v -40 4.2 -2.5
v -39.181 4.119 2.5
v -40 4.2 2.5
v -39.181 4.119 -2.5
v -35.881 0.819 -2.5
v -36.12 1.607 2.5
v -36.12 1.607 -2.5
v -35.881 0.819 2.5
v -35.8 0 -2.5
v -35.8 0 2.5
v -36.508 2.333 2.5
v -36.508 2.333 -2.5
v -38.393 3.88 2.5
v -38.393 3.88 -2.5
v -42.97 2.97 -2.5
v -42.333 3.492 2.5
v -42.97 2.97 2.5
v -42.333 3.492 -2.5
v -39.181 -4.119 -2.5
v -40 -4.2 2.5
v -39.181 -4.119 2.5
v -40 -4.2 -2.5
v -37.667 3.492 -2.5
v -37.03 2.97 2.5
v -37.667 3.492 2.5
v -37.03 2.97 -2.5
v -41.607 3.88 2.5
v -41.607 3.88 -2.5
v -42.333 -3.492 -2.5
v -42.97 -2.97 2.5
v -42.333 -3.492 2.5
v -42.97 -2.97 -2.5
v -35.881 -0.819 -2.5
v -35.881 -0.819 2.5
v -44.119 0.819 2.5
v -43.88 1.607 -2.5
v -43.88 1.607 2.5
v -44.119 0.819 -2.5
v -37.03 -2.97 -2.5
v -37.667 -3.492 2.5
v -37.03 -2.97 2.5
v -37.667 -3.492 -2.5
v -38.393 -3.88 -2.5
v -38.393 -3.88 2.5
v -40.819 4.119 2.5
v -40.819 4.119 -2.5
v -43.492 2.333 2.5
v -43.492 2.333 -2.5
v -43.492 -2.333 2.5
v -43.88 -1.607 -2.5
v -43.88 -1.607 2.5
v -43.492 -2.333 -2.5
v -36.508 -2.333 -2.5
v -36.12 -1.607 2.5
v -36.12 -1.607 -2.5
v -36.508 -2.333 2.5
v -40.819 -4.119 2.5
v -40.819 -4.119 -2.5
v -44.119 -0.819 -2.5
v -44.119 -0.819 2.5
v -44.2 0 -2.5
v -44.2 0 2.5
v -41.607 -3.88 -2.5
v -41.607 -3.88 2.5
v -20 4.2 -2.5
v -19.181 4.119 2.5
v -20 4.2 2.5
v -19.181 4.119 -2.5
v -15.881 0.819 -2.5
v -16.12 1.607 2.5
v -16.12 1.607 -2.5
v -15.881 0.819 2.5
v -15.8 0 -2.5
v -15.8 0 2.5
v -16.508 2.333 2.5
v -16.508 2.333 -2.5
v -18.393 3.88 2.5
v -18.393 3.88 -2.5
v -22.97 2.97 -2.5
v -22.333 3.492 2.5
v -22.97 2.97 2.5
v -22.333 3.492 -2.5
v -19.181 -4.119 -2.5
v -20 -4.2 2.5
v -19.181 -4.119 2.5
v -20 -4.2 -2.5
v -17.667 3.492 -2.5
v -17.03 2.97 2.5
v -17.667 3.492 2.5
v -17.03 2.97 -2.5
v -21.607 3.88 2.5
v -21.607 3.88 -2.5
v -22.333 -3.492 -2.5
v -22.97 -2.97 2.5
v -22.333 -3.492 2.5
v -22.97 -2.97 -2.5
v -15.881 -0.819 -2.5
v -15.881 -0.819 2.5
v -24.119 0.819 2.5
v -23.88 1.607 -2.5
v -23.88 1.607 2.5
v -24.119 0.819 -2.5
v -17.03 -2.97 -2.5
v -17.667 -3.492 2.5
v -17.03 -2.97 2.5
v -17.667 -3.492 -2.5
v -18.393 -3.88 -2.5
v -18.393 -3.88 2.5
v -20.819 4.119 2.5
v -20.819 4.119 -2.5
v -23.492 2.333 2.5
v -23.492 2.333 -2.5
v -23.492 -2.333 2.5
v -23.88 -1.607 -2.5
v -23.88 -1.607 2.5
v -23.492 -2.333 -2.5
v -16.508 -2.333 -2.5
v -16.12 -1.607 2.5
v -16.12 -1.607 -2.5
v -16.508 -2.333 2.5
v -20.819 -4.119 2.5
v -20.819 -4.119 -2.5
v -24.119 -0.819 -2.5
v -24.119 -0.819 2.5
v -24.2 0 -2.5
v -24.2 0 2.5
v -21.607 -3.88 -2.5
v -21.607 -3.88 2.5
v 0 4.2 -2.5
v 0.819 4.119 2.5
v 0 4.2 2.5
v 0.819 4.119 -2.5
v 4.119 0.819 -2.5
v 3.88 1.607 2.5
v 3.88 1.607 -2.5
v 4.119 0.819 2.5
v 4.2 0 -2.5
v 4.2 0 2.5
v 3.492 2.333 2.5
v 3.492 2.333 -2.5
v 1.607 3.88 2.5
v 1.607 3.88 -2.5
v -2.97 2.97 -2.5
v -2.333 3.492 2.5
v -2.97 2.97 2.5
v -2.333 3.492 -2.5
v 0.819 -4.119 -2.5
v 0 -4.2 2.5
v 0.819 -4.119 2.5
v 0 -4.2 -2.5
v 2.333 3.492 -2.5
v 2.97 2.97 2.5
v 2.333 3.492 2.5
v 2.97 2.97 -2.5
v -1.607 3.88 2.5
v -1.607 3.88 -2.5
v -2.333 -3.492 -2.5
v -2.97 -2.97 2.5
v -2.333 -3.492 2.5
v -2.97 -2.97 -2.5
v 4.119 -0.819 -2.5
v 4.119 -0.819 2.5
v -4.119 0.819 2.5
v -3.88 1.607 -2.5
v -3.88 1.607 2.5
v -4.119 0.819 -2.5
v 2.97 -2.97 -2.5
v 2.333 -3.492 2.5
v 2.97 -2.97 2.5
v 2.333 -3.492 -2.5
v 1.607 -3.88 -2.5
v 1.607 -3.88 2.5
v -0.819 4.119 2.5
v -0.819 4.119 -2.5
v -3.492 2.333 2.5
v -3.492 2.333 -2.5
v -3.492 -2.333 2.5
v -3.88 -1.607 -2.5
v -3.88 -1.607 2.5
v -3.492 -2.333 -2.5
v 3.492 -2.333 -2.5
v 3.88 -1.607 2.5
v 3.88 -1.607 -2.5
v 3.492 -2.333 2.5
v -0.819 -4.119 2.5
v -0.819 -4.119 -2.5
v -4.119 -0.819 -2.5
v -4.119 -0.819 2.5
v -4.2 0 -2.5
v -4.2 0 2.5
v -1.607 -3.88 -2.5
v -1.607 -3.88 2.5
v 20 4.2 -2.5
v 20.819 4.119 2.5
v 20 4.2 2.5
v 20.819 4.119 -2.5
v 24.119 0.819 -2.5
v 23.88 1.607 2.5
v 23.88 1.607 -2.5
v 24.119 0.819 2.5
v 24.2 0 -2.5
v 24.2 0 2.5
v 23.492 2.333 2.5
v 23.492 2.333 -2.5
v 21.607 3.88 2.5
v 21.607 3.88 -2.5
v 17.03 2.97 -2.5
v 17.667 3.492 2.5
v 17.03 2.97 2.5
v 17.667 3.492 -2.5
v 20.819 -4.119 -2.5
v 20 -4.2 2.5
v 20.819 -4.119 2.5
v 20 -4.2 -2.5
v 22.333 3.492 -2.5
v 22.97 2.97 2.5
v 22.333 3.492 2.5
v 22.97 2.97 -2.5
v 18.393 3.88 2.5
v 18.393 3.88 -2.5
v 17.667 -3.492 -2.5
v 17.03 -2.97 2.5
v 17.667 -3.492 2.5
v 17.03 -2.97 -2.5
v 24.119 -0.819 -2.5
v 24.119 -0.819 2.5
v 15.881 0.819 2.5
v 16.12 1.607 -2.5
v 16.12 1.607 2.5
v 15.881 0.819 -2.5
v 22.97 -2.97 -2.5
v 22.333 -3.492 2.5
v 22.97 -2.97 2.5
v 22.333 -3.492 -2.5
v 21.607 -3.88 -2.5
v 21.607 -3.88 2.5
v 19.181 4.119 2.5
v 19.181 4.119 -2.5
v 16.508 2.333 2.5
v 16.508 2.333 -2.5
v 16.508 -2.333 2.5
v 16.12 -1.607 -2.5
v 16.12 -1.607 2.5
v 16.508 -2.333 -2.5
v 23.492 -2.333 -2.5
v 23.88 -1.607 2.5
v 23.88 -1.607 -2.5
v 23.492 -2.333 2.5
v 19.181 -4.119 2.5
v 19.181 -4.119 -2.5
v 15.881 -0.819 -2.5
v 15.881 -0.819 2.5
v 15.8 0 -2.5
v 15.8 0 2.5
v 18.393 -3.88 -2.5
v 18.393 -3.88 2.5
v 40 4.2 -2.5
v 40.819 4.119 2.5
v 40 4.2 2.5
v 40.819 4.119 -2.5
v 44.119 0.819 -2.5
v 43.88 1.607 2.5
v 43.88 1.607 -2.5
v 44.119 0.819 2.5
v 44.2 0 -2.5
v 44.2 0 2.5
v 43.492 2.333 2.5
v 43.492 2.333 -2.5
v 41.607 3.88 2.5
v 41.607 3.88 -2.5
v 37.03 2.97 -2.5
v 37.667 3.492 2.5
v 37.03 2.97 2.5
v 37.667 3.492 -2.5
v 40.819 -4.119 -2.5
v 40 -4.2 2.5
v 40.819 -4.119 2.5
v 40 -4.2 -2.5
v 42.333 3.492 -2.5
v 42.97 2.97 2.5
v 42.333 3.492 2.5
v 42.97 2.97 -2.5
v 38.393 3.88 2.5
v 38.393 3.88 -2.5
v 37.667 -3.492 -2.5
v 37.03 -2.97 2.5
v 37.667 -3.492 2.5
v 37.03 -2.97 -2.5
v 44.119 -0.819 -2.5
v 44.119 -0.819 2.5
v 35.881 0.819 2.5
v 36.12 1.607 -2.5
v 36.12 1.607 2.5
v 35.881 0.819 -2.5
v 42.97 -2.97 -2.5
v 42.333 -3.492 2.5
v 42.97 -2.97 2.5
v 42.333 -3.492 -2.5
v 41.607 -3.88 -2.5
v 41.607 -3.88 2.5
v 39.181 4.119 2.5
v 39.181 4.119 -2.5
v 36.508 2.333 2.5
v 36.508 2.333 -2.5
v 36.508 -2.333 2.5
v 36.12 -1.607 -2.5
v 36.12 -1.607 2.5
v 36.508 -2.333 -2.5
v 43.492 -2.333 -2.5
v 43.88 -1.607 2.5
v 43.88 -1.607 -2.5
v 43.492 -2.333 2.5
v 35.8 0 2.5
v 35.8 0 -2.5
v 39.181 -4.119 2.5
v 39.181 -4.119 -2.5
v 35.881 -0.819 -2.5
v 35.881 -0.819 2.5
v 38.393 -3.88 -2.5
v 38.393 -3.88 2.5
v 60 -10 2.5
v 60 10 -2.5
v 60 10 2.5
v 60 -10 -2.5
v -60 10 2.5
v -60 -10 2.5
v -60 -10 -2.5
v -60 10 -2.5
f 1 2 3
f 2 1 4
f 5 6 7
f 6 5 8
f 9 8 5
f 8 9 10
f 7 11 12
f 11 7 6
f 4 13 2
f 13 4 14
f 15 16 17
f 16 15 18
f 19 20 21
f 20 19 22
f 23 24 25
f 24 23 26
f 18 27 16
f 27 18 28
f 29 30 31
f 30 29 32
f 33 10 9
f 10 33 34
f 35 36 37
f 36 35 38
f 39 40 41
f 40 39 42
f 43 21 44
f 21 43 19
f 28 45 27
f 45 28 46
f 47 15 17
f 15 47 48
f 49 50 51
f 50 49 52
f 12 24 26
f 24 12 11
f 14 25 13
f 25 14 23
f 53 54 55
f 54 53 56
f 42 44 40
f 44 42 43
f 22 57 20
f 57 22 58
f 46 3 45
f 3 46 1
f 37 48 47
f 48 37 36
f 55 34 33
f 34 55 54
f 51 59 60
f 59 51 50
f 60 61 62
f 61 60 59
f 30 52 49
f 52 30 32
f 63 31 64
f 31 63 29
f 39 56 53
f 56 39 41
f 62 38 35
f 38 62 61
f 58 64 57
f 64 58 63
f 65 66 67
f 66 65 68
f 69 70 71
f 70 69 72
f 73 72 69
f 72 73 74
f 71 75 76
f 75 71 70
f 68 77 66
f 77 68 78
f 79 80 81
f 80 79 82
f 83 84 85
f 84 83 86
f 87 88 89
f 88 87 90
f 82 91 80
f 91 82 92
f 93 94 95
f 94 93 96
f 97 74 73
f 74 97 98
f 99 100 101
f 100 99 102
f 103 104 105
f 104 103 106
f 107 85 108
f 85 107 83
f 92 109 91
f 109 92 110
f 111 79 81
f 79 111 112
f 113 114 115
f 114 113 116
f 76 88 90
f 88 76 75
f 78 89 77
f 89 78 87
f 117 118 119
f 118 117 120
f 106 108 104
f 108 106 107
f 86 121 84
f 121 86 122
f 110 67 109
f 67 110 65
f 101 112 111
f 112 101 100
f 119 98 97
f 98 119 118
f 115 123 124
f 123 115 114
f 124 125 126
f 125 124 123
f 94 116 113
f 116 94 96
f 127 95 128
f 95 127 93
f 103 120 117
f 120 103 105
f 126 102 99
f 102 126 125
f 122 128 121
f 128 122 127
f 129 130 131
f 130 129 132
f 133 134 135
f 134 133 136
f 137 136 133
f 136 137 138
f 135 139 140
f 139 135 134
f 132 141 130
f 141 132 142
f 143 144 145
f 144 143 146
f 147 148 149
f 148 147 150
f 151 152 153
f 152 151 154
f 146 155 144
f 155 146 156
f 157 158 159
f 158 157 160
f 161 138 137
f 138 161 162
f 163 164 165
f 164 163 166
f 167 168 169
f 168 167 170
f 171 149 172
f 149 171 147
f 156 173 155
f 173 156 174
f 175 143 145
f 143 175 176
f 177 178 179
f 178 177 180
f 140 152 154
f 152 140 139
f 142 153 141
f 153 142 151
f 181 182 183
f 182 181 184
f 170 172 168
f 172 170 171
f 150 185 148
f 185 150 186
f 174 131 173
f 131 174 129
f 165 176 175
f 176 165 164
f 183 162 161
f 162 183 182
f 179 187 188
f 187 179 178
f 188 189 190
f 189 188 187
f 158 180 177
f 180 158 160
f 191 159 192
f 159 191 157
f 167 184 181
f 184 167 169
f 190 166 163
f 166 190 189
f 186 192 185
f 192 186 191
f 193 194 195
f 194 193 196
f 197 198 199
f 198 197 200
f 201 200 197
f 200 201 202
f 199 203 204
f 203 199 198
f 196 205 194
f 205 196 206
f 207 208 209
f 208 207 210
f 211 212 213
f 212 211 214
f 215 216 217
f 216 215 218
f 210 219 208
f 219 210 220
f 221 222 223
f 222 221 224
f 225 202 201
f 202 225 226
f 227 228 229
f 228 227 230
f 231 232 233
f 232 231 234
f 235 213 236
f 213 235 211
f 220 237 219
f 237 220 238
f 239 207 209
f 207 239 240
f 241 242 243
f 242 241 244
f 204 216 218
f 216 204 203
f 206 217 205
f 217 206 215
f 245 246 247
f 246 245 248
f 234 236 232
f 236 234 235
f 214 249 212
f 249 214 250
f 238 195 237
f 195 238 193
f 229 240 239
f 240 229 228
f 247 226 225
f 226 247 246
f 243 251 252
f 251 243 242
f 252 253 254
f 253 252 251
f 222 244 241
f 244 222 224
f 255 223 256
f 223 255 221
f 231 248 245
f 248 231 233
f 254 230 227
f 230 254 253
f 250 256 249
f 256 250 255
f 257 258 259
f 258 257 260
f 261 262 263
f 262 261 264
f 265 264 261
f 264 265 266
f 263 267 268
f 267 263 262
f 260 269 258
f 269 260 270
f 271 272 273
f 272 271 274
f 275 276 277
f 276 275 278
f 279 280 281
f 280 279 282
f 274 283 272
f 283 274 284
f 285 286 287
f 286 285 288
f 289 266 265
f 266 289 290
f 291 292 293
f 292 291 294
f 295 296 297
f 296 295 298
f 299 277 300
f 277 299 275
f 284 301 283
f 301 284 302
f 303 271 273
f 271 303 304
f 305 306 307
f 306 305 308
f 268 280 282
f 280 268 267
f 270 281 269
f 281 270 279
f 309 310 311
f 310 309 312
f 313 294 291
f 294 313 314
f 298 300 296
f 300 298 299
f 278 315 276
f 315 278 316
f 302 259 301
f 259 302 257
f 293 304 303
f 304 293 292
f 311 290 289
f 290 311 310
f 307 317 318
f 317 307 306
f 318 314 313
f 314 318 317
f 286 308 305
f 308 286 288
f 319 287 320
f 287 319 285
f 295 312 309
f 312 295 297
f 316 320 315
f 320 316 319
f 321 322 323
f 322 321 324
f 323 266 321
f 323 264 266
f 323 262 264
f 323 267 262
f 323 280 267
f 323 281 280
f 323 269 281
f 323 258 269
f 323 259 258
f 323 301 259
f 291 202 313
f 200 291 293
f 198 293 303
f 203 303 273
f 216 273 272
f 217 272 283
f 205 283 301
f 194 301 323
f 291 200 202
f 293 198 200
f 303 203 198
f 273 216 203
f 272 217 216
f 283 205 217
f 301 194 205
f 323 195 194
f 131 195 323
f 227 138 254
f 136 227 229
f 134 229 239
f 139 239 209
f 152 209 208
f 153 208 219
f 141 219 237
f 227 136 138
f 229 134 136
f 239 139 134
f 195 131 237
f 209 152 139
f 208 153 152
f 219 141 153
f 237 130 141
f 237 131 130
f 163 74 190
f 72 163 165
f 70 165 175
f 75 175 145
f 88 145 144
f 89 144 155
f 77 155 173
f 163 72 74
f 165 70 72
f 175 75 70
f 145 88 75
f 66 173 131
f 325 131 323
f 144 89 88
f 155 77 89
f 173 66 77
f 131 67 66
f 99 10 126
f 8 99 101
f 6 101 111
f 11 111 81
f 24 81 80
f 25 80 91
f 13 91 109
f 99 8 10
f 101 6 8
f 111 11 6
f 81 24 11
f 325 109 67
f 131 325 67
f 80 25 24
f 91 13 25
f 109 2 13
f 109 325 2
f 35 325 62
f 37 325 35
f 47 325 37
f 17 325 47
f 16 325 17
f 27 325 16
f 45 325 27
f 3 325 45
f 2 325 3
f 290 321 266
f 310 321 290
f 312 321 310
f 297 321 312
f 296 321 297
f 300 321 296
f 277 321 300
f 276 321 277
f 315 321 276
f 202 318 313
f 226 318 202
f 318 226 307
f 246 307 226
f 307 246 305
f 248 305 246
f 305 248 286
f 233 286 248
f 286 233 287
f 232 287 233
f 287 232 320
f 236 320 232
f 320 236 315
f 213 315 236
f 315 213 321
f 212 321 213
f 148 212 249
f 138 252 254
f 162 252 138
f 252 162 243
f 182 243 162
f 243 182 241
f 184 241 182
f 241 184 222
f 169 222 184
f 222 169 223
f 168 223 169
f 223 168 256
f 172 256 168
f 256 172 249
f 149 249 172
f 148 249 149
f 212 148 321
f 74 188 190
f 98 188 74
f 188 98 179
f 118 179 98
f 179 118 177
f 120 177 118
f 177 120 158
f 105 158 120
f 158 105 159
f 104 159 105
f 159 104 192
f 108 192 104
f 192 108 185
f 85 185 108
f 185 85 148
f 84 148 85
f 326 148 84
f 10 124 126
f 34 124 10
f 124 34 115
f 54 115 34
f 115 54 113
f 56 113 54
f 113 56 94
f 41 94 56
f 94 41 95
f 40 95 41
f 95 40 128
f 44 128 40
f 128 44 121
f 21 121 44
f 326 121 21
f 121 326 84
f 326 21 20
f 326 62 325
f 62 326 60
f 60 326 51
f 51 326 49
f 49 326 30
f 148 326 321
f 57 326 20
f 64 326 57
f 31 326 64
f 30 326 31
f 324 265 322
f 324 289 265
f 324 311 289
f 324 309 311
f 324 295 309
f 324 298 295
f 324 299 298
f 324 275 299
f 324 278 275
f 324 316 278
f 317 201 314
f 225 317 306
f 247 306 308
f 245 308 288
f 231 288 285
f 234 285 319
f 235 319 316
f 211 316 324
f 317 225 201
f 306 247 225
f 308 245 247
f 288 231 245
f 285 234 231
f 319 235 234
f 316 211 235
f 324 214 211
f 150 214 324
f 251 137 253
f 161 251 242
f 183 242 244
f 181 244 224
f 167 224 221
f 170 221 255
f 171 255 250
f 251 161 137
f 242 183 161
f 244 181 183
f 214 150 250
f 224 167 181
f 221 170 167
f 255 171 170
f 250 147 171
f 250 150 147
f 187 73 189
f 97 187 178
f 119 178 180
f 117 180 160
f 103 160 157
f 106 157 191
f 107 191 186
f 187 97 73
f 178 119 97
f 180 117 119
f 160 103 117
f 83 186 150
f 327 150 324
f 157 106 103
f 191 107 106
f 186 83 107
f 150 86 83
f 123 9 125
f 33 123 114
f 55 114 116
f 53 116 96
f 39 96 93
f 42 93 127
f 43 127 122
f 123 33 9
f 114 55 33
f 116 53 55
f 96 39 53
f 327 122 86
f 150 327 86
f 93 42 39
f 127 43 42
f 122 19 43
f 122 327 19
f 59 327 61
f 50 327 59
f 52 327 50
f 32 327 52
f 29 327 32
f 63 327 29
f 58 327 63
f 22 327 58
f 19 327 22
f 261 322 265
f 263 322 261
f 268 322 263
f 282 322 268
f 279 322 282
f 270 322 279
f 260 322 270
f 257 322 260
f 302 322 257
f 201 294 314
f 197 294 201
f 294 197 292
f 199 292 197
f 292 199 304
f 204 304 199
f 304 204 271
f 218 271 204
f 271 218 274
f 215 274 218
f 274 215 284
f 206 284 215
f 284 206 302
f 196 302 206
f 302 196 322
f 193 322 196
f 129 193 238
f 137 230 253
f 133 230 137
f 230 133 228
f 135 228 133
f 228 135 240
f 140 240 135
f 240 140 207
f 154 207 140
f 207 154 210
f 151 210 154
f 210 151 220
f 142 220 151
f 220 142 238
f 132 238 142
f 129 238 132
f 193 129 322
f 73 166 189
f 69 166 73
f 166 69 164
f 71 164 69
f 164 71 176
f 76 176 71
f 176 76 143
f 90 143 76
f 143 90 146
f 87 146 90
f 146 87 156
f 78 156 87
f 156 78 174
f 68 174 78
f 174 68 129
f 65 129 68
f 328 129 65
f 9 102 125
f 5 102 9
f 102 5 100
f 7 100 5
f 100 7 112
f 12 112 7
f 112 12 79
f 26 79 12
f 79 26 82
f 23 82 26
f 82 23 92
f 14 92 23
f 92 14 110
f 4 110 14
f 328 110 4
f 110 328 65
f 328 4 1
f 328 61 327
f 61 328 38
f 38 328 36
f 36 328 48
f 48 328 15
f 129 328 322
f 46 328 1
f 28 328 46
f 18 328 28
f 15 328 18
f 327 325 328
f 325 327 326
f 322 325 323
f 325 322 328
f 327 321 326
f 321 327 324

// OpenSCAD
$fn = 32;

// ----------------------------------------------------------------------
// Hole bar, 5 x Ø8.4
// skip layout, 20 mm edge offset
// ----------------------------------------------------------------------

// --- parameters (mm) ---
bar_w = 20;       // bar width (Y)
bar_t = 5;        // bar thickness (Z)
holes = 5;        // holes per row
hole_d = 8.4;     // hole diameter
edge = 20;        // offset from the bar end to the first hole
grid_pitch = 10;  // grid the bar was laid out on

// --- derived feature positions (mm) ---
pitch = grid_pitch * 2;       // = 20   holes sit every other grid slot
span = (holes - 1) * pitch;   // = 80   distance between the end holes
bar_l = span + 2 * edge;      // = 120   overall bar length
start_x = -bar_l / 2 + edge;  // = -40   X of the first hole
feature_centers = [
  [start_x + 0 * pitch, 0],
  [start_x + 1 * pitch, 0],
  [start_x + 2 * pitch, 0],
  [start_x + 3 * pitch, 0],
  [start_x + 4 * pitch, 0]
];   // hole centres of the first row

// bar with one row of holes, drilled from feature_centers
difference() {
  translate([-bar_l / 2, -bar_w / 2, -bar_t / 2]) cube([bar_l, bar_w, bar_t]);
  for (centre = feature_centers)
    translate([centre[0], centre[1], 0])
      cylinder(d = hole_d, h = bar_t + 2, center = true);
}
